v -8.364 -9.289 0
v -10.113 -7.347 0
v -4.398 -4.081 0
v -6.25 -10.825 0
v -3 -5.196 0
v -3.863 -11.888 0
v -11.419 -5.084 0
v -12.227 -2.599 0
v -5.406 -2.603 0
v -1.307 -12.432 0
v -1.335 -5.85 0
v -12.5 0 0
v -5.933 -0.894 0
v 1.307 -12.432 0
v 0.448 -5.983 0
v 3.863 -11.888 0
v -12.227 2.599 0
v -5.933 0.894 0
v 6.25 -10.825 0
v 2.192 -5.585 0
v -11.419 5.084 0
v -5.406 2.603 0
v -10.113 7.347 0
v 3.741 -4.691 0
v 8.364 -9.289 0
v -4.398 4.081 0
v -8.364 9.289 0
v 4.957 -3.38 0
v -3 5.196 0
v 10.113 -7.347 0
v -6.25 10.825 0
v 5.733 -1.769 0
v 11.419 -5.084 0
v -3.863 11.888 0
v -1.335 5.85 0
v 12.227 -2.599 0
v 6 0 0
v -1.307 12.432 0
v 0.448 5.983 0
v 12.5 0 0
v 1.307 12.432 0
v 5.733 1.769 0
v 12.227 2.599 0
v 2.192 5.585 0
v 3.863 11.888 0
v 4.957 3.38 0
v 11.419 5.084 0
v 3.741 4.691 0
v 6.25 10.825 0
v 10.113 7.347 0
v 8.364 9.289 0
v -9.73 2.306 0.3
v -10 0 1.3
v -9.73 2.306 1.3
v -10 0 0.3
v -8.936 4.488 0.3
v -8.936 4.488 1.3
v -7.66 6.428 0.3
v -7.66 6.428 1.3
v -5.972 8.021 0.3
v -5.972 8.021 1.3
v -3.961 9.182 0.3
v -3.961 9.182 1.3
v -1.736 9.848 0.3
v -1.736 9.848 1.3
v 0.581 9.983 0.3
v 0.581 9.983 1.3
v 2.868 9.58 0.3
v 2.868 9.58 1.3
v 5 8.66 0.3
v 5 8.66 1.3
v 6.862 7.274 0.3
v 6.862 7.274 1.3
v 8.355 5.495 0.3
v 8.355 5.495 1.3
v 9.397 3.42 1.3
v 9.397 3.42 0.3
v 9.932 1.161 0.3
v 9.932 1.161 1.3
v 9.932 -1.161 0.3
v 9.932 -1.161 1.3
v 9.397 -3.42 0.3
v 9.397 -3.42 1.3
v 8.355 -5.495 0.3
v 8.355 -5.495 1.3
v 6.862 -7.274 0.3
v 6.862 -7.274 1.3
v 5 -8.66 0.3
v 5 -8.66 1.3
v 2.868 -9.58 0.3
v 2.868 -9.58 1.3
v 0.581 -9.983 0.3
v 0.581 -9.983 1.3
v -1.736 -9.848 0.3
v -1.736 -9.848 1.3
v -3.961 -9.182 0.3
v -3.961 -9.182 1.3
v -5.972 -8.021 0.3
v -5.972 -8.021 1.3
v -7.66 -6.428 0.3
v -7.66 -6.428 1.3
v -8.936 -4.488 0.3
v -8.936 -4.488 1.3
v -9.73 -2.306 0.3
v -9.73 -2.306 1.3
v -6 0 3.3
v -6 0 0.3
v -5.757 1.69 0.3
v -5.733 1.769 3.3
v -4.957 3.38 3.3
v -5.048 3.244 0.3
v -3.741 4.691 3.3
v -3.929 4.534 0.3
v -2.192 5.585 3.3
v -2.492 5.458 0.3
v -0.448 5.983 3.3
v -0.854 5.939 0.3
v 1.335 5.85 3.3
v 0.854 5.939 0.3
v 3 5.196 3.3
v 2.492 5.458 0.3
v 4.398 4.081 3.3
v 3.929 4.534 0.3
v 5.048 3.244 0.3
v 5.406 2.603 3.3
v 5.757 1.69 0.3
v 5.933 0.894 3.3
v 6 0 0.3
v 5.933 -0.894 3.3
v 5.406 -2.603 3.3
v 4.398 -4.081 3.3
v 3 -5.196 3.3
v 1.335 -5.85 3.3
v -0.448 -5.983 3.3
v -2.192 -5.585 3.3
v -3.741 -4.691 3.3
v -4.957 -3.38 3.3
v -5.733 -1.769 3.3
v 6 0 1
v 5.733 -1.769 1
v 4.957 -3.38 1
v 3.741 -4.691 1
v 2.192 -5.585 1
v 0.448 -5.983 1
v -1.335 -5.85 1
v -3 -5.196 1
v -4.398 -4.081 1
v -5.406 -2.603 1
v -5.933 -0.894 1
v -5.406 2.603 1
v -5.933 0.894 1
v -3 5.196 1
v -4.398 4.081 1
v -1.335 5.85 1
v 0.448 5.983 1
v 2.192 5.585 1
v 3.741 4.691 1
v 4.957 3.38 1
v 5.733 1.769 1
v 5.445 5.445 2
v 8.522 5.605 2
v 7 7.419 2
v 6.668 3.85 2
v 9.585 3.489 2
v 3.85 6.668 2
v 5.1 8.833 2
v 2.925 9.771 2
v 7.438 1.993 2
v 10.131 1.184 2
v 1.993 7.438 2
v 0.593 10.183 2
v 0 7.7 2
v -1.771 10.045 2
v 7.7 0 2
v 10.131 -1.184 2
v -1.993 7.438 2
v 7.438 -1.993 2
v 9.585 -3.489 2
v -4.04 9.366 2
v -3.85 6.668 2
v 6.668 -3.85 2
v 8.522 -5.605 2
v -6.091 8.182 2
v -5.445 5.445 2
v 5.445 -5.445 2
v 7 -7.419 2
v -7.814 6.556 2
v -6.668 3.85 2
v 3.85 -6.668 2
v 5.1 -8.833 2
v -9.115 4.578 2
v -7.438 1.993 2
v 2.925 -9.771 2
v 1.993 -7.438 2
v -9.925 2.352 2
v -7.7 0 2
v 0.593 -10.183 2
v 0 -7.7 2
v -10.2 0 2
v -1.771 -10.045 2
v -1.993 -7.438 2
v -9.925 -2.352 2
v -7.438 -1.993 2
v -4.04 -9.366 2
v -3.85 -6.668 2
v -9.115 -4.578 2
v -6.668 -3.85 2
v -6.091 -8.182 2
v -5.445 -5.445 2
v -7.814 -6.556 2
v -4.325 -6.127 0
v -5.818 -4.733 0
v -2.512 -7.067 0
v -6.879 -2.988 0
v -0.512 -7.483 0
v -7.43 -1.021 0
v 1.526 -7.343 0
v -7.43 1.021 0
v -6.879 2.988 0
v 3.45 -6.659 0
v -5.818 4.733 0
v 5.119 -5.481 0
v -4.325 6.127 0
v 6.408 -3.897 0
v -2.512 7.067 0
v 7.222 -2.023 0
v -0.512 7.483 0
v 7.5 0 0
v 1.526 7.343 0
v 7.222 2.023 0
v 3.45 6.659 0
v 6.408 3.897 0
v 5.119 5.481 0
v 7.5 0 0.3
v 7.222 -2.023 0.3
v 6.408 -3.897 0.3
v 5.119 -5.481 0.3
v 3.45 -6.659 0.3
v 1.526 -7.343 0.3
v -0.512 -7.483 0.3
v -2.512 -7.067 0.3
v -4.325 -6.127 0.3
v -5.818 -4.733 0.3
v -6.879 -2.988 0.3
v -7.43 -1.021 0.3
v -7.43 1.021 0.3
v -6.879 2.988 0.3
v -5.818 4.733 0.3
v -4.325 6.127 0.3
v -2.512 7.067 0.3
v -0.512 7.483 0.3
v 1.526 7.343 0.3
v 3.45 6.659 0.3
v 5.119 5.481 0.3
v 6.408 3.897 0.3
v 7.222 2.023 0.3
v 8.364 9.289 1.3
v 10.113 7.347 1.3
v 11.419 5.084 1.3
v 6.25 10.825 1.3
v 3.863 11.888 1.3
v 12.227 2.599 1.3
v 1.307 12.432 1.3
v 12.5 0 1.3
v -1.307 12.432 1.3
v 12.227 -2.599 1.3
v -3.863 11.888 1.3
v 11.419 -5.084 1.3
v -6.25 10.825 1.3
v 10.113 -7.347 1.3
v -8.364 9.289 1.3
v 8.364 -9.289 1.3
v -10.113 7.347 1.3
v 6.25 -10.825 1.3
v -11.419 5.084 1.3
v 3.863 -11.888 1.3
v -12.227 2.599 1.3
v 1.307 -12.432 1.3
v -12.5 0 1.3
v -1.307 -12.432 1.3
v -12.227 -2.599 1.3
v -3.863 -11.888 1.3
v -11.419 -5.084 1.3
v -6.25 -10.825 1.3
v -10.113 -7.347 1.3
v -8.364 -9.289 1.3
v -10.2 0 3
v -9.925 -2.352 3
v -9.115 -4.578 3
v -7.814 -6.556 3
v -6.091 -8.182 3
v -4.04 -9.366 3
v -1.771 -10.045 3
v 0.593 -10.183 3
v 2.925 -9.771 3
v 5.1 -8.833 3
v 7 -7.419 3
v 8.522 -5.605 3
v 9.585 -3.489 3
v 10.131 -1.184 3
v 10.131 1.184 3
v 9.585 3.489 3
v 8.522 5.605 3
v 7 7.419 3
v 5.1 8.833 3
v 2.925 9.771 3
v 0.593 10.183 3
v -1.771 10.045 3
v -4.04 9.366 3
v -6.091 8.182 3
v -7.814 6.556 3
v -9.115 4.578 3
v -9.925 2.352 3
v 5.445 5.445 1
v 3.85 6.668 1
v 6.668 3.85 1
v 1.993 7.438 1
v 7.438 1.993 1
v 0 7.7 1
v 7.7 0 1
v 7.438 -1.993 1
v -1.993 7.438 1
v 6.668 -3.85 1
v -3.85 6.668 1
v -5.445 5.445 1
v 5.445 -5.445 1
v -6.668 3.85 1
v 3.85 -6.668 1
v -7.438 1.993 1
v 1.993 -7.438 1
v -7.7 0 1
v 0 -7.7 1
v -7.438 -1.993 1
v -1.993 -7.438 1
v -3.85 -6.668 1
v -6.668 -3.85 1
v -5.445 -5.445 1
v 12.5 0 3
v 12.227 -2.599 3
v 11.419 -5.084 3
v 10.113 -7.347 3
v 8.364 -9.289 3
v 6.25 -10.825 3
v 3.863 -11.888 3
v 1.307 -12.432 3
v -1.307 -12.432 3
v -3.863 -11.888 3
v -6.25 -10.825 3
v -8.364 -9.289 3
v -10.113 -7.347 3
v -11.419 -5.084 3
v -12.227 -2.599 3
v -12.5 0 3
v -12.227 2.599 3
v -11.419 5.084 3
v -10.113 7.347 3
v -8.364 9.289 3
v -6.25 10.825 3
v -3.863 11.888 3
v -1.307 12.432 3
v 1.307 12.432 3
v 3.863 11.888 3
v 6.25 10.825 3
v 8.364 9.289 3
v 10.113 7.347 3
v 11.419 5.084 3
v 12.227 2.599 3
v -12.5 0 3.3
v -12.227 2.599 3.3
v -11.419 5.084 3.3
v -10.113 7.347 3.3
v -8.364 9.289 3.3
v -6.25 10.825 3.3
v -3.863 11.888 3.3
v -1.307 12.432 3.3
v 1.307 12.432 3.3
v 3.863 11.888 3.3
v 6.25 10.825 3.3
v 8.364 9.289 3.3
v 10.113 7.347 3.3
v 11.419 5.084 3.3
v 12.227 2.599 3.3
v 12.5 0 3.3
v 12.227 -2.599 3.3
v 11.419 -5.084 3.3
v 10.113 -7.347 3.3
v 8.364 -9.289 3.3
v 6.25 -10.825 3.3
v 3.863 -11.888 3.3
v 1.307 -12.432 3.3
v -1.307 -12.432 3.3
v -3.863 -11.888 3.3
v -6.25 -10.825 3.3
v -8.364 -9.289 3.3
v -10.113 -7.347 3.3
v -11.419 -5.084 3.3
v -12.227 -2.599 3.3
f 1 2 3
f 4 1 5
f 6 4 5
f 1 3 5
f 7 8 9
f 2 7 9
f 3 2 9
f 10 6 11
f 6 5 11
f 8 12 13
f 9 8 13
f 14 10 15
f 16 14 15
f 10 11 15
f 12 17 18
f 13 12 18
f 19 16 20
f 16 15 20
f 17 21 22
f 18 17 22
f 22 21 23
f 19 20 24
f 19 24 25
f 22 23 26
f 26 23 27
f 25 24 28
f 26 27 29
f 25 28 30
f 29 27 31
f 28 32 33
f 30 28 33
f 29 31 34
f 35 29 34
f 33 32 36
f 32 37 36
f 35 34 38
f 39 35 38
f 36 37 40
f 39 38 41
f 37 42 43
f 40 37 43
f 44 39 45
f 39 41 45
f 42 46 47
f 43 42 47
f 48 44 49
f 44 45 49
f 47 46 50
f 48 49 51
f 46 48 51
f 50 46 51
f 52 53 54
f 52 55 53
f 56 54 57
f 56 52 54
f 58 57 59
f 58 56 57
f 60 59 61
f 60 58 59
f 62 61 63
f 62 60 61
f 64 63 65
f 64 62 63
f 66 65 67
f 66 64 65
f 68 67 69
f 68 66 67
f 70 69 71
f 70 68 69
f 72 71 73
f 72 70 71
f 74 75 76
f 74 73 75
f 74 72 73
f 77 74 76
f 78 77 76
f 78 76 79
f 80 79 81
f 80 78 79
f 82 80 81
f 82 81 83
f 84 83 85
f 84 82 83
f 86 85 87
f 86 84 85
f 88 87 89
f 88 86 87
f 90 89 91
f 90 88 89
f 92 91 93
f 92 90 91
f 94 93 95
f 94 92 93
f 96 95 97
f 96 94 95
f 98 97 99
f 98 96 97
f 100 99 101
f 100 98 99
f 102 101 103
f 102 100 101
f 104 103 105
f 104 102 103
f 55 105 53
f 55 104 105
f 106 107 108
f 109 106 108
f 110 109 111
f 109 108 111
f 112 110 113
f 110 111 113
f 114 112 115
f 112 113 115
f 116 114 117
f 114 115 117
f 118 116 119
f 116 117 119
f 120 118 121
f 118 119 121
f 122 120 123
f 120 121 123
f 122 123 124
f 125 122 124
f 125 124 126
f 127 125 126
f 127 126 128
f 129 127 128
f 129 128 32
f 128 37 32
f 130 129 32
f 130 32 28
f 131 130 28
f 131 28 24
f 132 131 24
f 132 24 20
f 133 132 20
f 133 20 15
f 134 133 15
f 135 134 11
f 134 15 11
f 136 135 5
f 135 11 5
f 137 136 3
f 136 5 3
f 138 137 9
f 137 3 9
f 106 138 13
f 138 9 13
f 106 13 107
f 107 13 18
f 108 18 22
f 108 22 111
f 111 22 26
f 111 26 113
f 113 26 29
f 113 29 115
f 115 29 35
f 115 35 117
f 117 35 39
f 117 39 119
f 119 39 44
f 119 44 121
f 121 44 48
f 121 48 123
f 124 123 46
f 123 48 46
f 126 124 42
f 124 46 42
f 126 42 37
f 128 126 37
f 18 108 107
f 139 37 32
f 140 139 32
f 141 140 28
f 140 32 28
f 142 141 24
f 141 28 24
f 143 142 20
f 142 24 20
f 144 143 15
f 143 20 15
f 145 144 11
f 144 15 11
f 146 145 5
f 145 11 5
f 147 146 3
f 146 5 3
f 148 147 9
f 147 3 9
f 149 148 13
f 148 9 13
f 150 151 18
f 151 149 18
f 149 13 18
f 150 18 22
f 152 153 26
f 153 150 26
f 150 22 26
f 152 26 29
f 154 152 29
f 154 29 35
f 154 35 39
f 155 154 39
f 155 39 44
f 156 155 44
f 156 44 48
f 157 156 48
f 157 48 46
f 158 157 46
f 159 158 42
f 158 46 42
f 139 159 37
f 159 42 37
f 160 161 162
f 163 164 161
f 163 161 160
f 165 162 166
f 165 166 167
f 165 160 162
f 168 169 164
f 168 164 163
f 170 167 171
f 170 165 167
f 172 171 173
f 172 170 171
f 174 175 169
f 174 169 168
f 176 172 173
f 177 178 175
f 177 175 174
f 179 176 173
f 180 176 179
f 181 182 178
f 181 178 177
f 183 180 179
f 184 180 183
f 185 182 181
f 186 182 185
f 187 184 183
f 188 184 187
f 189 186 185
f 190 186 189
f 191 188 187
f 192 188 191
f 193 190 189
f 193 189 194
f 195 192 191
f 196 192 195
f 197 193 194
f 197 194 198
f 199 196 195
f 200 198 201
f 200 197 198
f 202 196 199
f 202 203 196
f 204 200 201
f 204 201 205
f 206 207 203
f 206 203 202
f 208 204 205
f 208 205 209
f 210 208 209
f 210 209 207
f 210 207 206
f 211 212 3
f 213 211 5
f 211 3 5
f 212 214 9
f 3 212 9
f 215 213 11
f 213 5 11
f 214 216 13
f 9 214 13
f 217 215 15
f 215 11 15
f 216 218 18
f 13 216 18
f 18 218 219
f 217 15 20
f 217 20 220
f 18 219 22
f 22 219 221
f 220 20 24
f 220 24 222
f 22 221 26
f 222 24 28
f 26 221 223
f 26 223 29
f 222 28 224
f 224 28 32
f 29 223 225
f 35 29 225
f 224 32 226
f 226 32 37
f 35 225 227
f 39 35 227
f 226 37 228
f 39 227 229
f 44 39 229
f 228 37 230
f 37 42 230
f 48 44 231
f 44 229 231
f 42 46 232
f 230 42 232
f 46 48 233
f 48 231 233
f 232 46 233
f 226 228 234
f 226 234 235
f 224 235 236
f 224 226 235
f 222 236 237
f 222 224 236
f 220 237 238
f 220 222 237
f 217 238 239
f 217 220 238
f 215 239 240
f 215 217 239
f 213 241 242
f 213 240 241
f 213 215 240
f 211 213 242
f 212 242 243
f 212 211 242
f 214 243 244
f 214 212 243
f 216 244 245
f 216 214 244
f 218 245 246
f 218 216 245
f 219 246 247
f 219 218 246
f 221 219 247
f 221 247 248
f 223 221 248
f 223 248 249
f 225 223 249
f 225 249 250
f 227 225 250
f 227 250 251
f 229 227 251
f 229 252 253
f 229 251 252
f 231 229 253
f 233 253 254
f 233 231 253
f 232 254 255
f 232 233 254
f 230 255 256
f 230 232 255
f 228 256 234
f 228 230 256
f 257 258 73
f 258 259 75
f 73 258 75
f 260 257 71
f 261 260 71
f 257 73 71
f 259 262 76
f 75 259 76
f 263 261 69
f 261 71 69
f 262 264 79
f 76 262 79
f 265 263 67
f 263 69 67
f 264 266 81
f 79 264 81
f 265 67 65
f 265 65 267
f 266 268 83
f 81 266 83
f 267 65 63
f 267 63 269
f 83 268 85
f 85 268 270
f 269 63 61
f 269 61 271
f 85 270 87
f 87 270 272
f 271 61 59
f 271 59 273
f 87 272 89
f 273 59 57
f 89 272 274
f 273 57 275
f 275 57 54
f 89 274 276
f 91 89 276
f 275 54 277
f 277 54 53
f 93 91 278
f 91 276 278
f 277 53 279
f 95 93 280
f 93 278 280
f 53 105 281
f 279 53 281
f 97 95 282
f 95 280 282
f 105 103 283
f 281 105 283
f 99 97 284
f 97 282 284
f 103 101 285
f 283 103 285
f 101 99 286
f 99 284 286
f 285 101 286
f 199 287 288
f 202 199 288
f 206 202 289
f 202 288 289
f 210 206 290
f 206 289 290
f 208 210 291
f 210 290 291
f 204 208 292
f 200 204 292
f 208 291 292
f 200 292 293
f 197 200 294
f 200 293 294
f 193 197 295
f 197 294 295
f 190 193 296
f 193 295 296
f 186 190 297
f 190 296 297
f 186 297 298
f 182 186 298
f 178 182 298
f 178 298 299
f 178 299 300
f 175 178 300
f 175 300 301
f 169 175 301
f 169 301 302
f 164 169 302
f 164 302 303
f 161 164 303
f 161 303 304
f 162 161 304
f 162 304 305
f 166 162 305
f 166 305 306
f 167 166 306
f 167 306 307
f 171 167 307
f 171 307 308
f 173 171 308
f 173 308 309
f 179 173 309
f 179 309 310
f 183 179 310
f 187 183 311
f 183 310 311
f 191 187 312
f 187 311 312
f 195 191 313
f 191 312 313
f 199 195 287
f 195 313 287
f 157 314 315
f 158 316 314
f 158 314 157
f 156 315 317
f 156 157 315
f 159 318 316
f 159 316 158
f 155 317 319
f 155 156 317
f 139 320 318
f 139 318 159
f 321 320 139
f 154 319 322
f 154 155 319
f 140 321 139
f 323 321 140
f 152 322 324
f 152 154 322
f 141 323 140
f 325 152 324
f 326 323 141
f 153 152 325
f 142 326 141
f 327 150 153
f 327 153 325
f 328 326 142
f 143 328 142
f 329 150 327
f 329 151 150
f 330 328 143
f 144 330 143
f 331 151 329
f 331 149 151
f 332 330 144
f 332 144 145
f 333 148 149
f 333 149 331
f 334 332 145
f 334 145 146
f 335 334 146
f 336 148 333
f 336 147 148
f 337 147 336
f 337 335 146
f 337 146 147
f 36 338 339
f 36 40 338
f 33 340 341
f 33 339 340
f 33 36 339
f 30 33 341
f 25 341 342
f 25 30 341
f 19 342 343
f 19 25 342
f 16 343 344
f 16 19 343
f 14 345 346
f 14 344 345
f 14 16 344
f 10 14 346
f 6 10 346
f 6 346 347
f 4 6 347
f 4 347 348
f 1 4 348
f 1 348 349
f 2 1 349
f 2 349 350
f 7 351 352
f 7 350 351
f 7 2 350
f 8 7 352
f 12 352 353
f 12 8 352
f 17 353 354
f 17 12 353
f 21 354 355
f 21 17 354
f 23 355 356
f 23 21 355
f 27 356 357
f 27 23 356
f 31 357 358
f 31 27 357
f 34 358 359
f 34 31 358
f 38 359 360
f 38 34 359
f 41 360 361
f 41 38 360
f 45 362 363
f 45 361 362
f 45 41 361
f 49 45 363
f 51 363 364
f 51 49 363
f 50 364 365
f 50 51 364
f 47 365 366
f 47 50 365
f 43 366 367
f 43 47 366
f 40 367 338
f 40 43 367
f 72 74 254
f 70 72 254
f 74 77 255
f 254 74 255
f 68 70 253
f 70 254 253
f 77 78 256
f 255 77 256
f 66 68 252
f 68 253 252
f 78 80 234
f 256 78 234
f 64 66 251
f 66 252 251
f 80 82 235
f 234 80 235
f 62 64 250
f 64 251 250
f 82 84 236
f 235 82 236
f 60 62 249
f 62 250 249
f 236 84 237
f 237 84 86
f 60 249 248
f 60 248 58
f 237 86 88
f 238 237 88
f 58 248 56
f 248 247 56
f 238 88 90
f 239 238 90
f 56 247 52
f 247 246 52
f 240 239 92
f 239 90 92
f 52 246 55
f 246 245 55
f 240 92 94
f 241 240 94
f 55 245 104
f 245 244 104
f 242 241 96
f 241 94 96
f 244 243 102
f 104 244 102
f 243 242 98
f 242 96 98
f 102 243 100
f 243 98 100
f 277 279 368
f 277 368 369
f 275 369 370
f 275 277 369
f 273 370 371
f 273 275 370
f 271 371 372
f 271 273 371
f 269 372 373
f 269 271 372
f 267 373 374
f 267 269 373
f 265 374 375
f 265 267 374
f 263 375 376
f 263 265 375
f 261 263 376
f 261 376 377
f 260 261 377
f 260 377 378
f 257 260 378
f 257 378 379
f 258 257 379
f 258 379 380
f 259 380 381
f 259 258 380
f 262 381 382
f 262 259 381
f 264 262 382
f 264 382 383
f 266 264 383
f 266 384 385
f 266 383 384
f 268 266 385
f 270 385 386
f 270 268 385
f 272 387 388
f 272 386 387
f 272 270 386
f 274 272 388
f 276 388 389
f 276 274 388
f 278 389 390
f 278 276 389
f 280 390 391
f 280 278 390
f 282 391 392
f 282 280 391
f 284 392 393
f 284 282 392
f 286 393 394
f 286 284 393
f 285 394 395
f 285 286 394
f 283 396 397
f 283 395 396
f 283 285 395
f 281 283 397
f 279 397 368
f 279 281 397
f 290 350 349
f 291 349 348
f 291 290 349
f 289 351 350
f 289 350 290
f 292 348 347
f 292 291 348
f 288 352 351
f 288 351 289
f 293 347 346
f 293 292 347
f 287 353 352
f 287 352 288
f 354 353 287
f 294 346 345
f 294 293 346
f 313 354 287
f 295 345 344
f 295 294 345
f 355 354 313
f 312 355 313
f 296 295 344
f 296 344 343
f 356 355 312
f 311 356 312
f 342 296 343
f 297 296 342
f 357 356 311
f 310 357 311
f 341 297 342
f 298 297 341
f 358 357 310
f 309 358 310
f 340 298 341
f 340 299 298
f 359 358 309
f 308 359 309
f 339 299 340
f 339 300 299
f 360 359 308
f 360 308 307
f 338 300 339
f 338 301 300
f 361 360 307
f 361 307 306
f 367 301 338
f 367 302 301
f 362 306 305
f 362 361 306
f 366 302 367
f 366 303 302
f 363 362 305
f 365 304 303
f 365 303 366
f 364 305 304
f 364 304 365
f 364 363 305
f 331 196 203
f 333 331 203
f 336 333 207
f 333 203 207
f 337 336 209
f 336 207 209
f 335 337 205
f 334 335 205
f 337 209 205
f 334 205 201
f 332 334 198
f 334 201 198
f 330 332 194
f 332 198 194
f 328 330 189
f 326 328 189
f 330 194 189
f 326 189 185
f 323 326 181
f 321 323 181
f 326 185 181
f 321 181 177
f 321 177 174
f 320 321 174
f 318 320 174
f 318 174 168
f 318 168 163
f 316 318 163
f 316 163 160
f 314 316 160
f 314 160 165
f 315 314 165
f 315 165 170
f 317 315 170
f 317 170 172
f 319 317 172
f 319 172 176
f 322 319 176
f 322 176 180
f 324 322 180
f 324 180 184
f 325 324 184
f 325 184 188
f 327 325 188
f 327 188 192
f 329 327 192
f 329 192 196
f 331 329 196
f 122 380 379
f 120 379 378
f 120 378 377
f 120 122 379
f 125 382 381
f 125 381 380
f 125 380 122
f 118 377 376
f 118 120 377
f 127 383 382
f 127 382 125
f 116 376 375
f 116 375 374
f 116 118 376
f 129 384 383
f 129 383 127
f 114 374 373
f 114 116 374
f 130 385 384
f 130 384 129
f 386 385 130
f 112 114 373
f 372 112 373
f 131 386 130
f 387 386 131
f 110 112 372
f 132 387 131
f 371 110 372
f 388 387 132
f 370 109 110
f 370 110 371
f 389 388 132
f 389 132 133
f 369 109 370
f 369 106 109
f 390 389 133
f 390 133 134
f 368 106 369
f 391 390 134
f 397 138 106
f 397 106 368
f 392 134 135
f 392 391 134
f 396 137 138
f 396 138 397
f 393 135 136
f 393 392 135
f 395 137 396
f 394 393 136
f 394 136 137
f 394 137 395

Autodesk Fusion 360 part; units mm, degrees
sketch "Sketch1" plane through (0, 0, 0) normal (0, 0, 1) x (1, 0, 0) in component "Base"
  circle A0 centre (0, 0) radius 12.5
  circle A1 centre (0, 0) radius 6
  dimension "d38" = 25
  dimension "d39" = 12
extrude "Extrude1" add sketch "Sketch1" along normal blind 3 makes body 1 in component "Base"
sketch "Sketch2" plane through (0, 0, 3) normal (0, 0, 1) x (-1, 0, 0) in component "Base"
  circle A0 centre (0, 0) radius 6
  circle A1 centre (0, 0) radius 12.5
  circle A2 centre (0, 0) radius 10.2
  dimension "d44" = 20.4
extrude "Extrude2" cut sketch "Sketch2" against normal blind 1 contours A2 bodies 1 in component "Base"
sketch "Sketch3" plane through (0, 0, 2) normal (0, 0, 1) x (-1, 0, 0) in component "Base"
  circle A0 centre (0, 0) radius 6
  circle A1 centre (0, 0) radius 10.2
  circle A2 centre (0, 0) radius 7.7
  dimension "d48" = 15.4
extrude "Extrude3" cut sketch "Sketch3" against normal blind 1 contours A2 bodies 1 in component "Base"
sketch "Sketch1 (2)" plane through (0, 0, 0) normal (0, 0, 1) x (1, 0, 0) in component "Lid"
  circle A0 centre (0, 0) radius 7.5
  circle A1 centre (0, 0) radius 6
  dimension "d51" = 12
  dimension "d52" = 15
extrude "Extrude1'" add sketch "Sketch1 (2)" along normal blind 0.3 separate body makes body 2 in component "Lid"
sketch "Sketch2 (2)" plane through (0, 0, 0.3) normal (0, 0, 1) x (-1, 0, 0) in component "Lid"
  circle A0 centre (0, 0) radius 6
  circle A1 centre (0, 0) radius 7.5
  circle A2 centre (0, 0) radius 6
  circle A3 centre (0, 0) radius 10
  dimension "d55" = 12
  dimension "d56" = 20
extrude "Extrude2'" add sketch "Sketch2 (2)" along normal blind 1 contours A1 | A3 bodies 2 in component "Lid"
sketch "Sketch3 (2)" plane through (0, 0, 1.3) normal (0, 0, 1) x (-1, 0, 0) in component "Lid"
  circle A0 centre (0, 0) radius 6
  circle A1 centre (0, 0) radius 10
  circle A2 centre (0, 0) radius 6
  circle A3 centre (0, 0) radius 12.5
  dimension "d59" = 25
  dimension "d60" = 12
extrude "Extrude3'" add sketch "Sketch3 (2)" along normal blind 2 contours A1 | A3 bodies 2 in component "Lid"
component "Base" placed x (1, 0, 0) y (0, 1, 0) z (0, 0, 1) at (0, 0, 0)
component "Lid" placed x (1, 0, 0) y (0, 1, 0) z (0, 0, 1) at (0, 0, 0)
equation "waveplate_t = 1 mm"
equation "waveplate_d = 15 mm"
equation "clear_aperture = 12 mm"
equation "external_d = 25 mm"
equation "pressure_extension = 0.3 mm"
equation "margin = 0.2 mm"
equation "mid_ring_d = 20 mm"
equation "d39 = clear_aperture"
equation "lid_external_t = 2 mm"
equation "base_t = 3 mm"
equation "d42 = base_t"
equation "d44 = mid_ring_d + 2 * margin"
equation "lid_insert_t = 1 mm"
equation "d46 = -lid_insert_t"
equation "d48 = waveplate_d + 2 * margin"
equation "d49 = -waveplate_t"
equation "d51 = clear_aperture"
equation "d52 = waveplate_d"
equation "d53 = pressure_extension"
equation "d55 = clear_aperture"
equation "d56 = mid_ring_d"
equation "d57 = lid_insert_t"
equation "d59 = external_d"
equation "d60 = clear_aperture"
equation "d61 = lid_external_t"
